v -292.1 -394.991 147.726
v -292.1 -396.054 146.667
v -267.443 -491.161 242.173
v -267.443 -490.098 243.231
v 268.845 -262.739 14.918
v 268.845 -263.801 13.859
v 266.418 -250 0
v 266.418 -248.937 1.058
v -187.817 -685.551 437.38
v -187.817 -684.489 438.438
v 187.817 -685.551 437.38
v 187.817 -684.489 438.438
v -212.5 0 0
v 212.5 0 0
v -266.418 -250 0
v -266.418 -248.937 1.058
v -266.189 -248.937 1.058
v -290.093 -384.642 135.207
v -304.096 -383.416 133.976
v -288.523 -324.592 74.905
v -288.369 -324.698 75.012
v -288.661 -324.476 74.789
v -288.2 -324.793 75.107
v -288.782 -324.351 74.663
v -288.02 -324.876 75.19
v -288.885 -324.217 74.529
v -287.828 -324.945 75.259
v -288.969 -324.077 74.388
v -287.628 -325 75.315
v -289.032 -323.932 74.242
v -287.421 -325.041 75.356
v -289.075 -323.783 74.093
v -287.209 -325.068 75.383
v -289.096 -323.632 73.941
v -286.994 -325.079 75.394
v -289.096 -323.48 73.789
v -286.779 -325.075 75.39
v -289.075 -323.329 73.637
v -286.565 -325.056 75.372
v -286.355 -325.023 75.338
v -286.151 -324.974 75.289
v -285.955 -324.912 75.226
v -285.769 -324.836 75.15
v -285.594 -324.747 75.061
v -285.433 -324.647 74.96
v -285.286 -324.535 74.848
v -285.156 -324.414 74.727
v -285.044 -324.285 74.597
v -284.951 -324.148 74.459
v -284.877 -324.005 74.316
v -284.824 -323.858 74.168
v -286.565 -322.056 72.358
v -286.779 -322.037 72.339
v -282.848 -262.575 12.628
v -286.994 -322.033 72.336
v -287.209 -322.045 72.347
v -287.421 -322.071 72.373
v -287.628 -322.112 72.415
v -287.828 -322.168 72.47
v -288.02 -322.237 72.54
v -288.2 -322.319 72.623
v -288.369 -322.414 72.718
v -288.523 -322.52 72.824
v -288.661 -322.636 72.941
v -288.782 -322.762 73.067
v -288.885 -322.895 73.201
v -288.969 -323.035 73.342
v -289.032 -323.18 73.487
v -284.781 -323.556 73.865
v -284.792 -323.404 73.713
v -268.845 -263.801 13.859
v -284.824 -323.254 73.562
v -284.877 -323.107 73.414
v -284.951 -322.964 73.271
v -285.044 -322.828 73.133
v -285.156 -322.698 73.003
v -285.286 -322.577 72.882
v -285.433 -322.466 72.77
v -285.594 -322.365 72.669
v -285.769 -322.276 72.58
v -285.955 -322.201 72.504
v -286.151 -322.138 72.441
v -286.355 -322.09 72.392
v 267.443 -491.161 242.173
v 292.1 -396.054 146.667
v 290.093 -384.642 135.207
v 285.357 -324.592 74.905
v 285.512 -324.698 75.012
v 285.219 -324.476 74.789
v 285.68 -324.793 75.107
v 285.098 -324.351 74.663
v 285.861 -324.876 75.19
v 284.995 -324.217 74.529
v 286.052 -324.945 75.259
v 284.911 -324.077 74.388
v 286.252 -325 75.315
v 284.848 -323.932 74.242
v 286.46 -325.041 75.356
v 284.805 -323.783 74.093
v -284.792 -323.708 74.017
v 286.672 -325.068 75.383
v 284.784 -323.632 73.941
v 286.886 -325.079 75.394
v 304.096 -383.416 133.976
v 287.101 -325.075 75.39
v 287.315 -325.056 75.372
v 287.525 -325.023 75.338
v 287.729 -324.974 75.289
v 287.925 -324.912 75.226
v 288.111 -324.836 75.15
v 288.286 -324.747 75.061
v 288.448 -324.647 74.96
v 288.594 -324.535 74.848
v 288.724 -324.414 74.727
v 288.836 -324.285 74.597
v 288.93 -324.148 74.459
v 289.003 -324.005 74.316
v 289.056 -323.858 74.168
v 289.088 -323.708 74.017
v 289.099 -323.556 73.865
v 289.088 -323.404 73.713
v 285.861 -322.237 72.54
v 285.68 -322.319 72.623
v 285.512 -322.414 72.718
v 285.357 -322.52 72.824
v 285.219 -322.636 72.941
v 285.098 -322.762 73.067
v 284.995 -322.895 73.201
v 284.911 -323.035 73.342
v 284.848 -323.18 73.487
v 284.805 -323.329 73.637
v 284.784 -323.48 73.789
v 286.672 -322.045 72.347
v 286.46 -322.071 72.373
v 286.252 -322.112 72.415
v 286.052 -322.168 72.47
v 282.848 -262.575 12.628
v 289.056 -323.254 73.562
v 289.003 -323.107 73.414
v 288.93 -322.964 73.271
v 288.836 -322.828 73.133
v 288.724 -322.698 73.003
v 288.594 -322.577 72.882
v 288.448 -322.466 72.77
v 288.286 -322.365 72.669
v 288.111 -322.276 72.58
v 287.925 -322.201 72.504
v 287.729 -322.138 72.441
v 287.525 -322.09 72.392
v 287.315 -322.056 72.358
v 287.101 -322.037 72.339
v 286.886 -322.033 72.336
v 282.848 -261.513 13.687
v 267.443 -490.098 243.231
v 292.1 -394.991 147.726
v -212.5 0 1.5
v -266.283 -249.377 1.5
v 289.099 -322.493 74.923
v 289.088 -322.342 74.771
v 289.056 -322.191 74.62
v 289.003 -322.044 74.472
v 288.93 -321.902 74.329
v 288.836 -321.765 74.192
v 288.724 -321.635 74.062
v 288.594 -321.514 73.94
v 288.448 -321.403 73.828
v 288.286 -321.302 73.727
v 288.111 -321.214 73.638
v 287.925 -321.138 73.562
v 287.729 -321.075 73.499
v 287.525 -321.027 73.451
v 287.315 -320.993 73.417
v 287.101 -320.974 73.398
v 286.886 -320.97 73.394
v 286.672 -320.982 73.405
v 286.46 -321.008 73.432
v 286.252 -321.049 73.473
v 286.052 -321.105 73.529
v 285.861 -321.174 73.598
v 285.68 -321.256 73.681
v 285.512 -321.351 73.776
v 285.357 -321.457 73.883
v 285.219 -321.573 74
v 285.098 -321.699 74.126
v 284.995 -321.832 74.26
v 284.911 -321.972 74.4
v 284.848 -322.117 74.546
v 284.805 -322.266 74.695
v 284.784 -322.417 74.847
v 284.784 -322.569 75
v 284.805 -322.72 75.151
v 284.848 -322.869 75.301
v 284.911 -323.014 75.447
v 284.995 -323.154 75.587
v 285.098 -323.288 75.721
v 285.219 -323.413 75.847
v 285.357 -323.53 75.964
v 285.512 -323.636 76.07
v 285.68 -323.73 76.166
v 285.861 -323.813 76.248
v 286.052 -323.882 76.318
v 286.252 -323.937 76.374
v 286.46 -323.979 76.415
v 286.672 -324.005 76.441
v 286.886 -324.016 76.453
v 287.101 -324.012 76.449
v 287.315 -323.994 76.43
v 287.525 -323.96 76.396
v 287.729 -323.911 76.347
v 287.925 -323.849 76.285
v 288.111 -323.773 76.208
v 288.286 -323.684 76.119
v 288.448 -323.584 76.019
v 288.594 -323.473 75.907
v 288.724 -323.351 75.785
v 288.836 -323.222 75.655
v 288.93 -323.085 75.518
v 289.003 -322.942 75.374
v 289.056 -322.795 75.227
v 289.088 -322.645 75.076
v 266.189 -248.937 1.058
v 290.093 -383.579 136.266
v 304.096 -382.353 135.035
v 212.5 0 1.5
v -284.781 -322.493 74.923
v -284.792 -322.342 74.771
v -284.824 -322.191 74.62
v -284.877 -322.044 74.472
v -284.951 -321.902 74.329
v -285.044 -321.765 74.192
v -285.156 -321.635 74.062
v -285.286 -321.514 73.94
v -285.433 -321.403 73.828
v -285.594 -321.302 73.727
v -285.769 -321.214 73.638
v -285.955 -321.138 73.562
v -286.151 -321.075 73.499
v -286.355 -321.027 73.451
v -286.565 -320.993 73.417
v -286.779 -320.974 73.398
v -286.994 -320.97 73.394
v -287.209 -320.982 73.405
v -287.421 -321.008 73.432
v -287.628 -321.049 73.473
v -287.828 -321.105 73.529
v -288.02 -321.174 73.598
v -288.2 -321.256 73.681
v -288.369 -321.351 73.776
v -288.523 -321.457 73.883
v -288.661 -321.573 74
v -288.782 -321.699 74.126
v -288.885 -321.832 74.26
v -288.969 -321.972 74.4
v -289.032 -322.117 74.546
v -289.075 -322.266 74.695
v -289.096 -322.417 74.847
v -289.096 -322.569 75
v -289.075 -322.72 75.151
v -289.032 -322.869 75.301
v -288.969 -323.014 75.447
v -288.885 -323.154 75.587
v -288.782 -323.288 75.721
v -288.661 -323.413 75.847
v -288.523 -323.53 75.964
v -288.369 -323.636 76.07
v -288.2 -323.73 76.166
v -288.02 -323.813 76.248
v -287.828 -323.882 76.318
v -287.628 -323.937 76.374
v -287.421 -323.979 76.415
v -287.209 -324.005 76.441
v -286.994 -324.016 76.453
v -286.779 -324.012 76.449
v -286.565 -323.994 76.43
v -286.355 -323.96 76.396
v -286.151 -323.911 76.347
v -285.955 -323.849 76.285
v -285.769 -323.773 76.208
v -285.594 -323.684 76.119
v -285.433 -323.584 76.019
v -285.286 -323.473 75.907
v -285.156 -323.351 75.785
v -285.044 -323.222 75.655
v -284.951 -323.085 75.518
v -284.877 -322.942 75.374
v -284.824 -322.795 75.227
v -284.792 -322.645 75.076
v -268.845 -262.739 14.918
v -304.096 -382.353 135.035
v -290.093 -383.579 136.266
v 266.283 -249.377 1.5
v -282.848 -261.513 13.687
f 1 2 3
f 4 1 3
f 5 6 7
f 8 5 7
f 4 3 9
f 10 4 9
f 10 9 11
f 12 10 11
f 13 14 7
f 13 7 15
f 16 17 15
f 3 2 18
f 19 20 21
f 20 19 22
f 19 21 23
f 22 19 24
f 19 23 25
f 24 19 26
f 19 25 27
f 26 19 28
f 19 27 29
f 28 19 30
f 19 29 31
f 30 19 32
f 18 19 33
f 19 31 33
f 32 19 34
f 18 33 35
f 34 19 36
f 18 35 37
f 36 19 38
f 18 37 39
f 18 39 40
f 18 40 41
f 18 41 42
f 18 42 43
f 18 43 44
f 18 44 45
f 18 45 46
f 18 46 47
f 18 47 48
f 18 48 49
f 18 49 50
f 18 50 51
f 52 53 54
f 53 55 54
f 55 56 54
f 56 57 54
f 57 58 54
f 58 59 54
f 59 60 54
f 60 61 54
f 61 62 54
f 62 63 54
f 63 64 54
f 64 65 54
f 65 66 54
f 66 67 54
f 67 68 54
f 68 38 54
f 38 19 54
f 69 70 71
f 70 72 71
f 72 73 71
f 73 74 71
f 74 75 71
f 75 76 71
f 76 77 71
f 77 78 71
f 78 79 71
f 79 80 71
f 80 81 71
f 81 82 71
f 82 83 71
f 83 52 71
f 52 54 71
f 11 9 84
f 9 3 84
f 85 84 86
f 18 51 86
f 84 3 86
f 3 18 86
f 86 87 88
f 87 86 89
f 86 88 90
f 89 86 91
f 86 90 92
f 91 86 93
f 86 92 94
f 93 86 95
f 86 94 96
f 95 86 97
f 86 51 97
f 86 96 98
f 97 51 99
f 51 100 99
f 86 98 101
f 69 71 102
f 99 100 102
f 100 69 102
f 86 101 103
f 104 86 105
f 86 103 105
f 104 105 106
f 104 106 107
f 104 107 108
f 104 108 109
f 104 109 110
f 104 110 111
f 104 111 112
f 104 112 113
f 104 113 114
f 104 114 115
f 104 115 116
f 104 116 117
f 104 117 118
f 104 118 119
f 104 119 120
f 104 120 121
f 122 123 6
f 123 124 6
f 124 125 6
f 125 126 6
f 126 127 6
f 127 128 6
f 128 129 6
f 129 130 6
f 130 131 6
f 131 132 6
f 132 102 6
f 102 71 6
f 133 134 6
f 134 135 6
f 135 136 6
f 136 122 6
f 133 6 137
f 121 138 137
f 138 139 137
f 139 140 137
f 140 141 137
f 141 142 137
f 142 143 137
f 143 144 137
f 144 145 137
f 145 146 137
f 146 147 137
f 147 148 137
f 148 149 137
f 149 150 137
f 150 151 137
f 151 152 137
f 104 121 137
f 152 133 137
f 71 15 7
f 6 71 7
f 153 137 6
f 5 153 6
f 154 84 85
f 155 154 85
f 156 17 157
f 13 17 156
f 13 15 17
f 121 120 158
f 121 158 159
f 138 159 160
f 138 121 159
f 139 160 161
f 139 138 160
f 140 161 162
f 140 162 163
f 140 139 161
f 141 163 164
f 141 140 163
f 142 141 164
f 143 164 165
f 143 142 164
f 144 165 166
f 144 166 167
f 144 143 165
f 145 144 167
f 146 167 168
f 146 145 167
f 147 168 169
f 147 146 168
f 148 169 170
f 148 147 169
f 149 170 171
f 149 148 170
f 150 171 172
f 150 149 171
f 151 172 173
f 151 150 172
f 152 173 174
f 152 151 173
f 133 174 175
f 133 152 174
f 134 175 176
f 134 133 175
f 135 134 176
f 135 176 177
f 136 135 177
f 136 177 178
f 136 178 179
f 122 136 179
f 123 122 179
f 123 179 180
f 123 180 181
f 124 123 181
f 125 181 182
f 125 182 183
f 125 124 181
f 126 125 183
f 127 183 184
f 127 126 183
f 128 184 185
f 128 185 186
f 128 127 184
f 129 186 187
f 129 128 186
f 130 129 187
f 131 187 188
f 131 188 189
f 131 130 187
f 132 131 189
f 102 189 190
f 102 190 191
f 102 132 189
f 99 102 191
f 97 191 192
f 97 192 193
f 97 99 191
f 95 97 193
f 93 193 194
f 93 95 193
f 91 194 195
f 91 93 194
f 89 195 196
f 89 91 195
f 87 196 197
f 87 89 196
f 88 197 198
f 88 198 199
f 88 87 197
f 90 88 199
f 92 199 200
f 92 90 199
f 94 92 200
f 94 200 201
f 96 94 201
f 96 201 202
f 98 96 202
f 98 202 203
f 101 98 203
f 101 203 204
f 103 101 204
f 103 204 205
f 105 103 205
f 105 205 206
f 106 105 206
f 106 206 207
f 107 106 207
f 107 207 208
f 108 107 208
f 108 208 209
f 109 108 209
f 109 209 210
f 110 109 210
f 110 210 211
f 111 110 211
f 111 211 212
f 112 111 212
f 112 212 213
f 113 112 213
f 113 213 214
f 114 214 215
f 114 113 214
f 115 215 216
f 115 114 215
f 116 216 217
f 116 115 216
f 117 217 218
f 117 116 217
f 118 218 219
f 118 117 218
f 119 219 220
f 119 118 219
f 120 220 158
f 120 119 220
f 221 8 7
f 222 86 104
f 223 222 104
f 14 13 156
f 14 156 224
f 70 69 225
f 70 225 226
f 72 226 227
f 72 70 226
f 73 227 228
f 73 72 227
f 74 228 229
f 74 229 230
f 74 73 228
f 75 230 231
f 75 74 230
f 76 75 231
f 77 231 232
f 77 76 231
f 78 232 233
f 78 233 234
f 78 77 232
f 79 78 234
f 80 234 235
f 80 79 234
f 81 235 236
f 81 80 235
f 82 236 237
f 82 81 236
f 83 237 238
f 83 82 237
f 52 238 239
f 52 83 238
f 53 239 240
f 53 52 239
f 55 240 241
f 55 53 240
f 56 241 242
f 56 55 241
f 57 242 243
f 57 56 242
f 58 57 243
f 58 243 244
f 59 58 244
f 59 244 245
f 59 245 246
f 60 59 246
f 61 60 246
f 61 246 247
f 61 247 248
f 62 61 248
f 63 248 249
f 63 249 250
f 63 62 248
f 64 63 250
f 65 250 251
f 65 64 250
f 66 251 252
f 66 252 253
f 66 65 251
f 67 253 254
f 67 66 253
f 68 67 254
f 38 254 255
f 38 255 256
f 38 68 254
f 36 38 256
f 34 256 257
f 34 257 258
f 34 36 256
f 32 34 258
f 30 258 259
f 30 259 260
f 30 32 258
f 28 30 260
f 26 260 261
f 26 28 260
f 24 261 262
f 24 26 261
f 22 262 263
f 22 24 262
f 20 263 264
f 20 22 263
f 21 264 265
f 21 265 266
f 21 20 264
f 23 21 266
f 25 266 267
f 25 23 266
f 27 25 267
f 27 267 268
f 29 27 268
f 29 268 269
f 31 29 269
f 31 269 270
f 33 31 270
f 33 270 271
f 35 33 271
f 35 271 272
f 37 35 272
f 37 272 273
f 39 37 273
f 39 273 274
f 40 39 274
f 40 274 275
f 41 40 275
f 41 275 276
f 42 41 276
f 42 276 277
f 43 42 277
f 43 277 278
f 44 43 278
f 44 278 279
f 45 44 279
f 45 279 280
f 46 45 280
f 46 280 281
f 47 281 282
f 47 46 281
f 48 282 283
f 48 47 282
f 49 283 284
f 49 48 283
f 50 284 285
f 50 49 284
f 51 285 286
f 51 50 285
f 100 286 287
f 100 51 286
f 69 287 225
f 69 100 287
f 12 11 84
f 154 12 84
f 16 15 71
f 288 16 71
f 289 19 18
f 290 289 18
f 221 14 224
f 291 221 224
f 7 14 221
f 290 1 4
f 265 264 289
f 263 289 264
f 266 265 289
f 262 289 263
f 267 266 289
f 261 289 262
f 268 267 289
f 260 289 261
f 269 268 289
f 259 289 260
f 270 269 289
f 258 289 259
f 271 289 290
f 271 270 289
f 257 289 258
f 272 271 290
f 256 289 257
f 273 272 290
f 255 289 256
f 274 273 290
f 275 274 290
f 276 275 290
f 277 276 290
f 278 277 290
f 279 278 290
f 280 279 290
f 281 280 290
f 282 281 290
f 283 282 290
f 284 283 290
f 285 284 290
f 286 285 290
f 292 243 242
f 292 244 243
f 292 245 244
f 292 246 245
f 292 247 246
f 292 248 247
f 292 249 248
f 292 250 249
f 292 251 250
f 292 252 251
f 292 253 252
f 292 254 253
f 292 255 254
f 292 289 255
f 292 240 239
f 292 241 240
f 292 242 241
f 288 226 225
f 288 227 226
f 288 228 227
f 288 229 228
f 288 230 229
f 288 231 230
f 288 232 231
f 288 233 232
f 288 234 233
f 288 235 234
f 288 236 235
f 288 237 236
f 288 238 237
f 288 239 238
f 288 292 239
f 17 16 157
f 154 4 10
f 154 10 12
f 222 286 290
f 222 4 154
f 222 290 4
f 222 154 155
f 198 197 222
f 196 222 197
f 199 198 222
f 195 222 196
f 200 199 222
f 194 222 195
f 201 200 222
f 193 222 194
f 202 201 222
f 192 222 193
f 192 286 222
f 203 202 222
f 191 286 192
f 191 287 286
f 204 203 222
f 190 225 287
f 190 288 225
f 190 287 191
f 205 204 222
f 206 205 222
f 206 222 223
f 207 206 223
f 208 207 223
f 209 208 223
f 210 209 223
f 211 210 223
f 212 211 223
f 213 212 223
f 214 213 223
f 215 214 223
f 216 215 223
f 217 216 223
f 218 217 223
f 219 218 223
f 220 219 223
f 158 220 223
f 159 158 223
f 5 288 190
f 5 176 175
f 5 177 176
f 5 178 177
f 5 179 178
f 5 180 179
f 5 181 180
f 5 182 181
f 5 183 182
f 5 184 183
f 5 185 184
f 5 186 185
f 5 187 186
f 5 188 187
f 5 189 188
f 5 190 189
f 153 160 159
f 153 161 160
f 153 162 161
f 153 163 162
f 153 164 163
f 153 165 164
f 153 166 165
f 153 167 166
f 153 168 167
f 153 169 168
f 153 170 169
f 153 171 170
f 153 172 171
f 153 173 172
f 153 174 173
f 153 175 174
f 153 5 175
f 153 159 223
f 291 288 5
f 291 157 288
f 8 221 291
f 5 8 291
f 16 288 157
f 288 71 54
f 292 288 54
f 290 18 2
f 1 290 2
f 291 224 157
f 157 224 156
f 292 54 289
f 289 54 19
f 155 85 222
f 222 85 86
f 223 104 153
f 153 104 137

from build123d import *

# Parameters (mm, degrees)
UPPER_DEPTH = 1.5
SKETCH2_R   = 2.159
LOWER_DEPTH = 1.5


with BuildPart() as part:
    # Sketch1 → Upper (new body)
    with BuildSketch(Plane.XY):
        Polygon((-212.5, 0), (212.5, 0), (266.41785, -250), (-266.41785, -250), align=None)
    extrude(amount=UPPER_DEPTH)

    # Sketch2 → Lower (add)
    with BuildSketch(Plane(origin=(0, -125.523597244, -124.998903379), x_dir=(1, 0, 0), z_dir=(0, 0.70858619, 0.70562427))):
        Polygon((-187.8166, -793.662967608), (187.8166, -793.662967608), (267.44325, -518.175167608), (292.1, -383.391867608), (266.41785, -176.406067608), (-266.41785, -176.406067608), (-292.1, -383.391867608), (-267.44325, -518.175167608), align=None)
        Polygon((-290.093306858, -367.218884221), (-268.844696442, -195.965284898), (-282.847719378, -194.227833655), (-304.096329794, -365.481432978), align=None)
        with Locations((-286.940102201, -280.648769571)):
            Circle(SKETCH2_R, mode=Mode.SUBTRACT)
        Polygon((282.847719378, -194.227833655), (268.844696442, -195.965284898), (290.093306858, -367.218884221), (304.096329794, -365.481432978), align=None)
        with Locations((286.940102201, -280.648769571)):
            Circle(SKETCH2_R, mode=Mode.SUBTRACT)
    extrude(amount=LOWER_DEPTH)


solid = part.part
